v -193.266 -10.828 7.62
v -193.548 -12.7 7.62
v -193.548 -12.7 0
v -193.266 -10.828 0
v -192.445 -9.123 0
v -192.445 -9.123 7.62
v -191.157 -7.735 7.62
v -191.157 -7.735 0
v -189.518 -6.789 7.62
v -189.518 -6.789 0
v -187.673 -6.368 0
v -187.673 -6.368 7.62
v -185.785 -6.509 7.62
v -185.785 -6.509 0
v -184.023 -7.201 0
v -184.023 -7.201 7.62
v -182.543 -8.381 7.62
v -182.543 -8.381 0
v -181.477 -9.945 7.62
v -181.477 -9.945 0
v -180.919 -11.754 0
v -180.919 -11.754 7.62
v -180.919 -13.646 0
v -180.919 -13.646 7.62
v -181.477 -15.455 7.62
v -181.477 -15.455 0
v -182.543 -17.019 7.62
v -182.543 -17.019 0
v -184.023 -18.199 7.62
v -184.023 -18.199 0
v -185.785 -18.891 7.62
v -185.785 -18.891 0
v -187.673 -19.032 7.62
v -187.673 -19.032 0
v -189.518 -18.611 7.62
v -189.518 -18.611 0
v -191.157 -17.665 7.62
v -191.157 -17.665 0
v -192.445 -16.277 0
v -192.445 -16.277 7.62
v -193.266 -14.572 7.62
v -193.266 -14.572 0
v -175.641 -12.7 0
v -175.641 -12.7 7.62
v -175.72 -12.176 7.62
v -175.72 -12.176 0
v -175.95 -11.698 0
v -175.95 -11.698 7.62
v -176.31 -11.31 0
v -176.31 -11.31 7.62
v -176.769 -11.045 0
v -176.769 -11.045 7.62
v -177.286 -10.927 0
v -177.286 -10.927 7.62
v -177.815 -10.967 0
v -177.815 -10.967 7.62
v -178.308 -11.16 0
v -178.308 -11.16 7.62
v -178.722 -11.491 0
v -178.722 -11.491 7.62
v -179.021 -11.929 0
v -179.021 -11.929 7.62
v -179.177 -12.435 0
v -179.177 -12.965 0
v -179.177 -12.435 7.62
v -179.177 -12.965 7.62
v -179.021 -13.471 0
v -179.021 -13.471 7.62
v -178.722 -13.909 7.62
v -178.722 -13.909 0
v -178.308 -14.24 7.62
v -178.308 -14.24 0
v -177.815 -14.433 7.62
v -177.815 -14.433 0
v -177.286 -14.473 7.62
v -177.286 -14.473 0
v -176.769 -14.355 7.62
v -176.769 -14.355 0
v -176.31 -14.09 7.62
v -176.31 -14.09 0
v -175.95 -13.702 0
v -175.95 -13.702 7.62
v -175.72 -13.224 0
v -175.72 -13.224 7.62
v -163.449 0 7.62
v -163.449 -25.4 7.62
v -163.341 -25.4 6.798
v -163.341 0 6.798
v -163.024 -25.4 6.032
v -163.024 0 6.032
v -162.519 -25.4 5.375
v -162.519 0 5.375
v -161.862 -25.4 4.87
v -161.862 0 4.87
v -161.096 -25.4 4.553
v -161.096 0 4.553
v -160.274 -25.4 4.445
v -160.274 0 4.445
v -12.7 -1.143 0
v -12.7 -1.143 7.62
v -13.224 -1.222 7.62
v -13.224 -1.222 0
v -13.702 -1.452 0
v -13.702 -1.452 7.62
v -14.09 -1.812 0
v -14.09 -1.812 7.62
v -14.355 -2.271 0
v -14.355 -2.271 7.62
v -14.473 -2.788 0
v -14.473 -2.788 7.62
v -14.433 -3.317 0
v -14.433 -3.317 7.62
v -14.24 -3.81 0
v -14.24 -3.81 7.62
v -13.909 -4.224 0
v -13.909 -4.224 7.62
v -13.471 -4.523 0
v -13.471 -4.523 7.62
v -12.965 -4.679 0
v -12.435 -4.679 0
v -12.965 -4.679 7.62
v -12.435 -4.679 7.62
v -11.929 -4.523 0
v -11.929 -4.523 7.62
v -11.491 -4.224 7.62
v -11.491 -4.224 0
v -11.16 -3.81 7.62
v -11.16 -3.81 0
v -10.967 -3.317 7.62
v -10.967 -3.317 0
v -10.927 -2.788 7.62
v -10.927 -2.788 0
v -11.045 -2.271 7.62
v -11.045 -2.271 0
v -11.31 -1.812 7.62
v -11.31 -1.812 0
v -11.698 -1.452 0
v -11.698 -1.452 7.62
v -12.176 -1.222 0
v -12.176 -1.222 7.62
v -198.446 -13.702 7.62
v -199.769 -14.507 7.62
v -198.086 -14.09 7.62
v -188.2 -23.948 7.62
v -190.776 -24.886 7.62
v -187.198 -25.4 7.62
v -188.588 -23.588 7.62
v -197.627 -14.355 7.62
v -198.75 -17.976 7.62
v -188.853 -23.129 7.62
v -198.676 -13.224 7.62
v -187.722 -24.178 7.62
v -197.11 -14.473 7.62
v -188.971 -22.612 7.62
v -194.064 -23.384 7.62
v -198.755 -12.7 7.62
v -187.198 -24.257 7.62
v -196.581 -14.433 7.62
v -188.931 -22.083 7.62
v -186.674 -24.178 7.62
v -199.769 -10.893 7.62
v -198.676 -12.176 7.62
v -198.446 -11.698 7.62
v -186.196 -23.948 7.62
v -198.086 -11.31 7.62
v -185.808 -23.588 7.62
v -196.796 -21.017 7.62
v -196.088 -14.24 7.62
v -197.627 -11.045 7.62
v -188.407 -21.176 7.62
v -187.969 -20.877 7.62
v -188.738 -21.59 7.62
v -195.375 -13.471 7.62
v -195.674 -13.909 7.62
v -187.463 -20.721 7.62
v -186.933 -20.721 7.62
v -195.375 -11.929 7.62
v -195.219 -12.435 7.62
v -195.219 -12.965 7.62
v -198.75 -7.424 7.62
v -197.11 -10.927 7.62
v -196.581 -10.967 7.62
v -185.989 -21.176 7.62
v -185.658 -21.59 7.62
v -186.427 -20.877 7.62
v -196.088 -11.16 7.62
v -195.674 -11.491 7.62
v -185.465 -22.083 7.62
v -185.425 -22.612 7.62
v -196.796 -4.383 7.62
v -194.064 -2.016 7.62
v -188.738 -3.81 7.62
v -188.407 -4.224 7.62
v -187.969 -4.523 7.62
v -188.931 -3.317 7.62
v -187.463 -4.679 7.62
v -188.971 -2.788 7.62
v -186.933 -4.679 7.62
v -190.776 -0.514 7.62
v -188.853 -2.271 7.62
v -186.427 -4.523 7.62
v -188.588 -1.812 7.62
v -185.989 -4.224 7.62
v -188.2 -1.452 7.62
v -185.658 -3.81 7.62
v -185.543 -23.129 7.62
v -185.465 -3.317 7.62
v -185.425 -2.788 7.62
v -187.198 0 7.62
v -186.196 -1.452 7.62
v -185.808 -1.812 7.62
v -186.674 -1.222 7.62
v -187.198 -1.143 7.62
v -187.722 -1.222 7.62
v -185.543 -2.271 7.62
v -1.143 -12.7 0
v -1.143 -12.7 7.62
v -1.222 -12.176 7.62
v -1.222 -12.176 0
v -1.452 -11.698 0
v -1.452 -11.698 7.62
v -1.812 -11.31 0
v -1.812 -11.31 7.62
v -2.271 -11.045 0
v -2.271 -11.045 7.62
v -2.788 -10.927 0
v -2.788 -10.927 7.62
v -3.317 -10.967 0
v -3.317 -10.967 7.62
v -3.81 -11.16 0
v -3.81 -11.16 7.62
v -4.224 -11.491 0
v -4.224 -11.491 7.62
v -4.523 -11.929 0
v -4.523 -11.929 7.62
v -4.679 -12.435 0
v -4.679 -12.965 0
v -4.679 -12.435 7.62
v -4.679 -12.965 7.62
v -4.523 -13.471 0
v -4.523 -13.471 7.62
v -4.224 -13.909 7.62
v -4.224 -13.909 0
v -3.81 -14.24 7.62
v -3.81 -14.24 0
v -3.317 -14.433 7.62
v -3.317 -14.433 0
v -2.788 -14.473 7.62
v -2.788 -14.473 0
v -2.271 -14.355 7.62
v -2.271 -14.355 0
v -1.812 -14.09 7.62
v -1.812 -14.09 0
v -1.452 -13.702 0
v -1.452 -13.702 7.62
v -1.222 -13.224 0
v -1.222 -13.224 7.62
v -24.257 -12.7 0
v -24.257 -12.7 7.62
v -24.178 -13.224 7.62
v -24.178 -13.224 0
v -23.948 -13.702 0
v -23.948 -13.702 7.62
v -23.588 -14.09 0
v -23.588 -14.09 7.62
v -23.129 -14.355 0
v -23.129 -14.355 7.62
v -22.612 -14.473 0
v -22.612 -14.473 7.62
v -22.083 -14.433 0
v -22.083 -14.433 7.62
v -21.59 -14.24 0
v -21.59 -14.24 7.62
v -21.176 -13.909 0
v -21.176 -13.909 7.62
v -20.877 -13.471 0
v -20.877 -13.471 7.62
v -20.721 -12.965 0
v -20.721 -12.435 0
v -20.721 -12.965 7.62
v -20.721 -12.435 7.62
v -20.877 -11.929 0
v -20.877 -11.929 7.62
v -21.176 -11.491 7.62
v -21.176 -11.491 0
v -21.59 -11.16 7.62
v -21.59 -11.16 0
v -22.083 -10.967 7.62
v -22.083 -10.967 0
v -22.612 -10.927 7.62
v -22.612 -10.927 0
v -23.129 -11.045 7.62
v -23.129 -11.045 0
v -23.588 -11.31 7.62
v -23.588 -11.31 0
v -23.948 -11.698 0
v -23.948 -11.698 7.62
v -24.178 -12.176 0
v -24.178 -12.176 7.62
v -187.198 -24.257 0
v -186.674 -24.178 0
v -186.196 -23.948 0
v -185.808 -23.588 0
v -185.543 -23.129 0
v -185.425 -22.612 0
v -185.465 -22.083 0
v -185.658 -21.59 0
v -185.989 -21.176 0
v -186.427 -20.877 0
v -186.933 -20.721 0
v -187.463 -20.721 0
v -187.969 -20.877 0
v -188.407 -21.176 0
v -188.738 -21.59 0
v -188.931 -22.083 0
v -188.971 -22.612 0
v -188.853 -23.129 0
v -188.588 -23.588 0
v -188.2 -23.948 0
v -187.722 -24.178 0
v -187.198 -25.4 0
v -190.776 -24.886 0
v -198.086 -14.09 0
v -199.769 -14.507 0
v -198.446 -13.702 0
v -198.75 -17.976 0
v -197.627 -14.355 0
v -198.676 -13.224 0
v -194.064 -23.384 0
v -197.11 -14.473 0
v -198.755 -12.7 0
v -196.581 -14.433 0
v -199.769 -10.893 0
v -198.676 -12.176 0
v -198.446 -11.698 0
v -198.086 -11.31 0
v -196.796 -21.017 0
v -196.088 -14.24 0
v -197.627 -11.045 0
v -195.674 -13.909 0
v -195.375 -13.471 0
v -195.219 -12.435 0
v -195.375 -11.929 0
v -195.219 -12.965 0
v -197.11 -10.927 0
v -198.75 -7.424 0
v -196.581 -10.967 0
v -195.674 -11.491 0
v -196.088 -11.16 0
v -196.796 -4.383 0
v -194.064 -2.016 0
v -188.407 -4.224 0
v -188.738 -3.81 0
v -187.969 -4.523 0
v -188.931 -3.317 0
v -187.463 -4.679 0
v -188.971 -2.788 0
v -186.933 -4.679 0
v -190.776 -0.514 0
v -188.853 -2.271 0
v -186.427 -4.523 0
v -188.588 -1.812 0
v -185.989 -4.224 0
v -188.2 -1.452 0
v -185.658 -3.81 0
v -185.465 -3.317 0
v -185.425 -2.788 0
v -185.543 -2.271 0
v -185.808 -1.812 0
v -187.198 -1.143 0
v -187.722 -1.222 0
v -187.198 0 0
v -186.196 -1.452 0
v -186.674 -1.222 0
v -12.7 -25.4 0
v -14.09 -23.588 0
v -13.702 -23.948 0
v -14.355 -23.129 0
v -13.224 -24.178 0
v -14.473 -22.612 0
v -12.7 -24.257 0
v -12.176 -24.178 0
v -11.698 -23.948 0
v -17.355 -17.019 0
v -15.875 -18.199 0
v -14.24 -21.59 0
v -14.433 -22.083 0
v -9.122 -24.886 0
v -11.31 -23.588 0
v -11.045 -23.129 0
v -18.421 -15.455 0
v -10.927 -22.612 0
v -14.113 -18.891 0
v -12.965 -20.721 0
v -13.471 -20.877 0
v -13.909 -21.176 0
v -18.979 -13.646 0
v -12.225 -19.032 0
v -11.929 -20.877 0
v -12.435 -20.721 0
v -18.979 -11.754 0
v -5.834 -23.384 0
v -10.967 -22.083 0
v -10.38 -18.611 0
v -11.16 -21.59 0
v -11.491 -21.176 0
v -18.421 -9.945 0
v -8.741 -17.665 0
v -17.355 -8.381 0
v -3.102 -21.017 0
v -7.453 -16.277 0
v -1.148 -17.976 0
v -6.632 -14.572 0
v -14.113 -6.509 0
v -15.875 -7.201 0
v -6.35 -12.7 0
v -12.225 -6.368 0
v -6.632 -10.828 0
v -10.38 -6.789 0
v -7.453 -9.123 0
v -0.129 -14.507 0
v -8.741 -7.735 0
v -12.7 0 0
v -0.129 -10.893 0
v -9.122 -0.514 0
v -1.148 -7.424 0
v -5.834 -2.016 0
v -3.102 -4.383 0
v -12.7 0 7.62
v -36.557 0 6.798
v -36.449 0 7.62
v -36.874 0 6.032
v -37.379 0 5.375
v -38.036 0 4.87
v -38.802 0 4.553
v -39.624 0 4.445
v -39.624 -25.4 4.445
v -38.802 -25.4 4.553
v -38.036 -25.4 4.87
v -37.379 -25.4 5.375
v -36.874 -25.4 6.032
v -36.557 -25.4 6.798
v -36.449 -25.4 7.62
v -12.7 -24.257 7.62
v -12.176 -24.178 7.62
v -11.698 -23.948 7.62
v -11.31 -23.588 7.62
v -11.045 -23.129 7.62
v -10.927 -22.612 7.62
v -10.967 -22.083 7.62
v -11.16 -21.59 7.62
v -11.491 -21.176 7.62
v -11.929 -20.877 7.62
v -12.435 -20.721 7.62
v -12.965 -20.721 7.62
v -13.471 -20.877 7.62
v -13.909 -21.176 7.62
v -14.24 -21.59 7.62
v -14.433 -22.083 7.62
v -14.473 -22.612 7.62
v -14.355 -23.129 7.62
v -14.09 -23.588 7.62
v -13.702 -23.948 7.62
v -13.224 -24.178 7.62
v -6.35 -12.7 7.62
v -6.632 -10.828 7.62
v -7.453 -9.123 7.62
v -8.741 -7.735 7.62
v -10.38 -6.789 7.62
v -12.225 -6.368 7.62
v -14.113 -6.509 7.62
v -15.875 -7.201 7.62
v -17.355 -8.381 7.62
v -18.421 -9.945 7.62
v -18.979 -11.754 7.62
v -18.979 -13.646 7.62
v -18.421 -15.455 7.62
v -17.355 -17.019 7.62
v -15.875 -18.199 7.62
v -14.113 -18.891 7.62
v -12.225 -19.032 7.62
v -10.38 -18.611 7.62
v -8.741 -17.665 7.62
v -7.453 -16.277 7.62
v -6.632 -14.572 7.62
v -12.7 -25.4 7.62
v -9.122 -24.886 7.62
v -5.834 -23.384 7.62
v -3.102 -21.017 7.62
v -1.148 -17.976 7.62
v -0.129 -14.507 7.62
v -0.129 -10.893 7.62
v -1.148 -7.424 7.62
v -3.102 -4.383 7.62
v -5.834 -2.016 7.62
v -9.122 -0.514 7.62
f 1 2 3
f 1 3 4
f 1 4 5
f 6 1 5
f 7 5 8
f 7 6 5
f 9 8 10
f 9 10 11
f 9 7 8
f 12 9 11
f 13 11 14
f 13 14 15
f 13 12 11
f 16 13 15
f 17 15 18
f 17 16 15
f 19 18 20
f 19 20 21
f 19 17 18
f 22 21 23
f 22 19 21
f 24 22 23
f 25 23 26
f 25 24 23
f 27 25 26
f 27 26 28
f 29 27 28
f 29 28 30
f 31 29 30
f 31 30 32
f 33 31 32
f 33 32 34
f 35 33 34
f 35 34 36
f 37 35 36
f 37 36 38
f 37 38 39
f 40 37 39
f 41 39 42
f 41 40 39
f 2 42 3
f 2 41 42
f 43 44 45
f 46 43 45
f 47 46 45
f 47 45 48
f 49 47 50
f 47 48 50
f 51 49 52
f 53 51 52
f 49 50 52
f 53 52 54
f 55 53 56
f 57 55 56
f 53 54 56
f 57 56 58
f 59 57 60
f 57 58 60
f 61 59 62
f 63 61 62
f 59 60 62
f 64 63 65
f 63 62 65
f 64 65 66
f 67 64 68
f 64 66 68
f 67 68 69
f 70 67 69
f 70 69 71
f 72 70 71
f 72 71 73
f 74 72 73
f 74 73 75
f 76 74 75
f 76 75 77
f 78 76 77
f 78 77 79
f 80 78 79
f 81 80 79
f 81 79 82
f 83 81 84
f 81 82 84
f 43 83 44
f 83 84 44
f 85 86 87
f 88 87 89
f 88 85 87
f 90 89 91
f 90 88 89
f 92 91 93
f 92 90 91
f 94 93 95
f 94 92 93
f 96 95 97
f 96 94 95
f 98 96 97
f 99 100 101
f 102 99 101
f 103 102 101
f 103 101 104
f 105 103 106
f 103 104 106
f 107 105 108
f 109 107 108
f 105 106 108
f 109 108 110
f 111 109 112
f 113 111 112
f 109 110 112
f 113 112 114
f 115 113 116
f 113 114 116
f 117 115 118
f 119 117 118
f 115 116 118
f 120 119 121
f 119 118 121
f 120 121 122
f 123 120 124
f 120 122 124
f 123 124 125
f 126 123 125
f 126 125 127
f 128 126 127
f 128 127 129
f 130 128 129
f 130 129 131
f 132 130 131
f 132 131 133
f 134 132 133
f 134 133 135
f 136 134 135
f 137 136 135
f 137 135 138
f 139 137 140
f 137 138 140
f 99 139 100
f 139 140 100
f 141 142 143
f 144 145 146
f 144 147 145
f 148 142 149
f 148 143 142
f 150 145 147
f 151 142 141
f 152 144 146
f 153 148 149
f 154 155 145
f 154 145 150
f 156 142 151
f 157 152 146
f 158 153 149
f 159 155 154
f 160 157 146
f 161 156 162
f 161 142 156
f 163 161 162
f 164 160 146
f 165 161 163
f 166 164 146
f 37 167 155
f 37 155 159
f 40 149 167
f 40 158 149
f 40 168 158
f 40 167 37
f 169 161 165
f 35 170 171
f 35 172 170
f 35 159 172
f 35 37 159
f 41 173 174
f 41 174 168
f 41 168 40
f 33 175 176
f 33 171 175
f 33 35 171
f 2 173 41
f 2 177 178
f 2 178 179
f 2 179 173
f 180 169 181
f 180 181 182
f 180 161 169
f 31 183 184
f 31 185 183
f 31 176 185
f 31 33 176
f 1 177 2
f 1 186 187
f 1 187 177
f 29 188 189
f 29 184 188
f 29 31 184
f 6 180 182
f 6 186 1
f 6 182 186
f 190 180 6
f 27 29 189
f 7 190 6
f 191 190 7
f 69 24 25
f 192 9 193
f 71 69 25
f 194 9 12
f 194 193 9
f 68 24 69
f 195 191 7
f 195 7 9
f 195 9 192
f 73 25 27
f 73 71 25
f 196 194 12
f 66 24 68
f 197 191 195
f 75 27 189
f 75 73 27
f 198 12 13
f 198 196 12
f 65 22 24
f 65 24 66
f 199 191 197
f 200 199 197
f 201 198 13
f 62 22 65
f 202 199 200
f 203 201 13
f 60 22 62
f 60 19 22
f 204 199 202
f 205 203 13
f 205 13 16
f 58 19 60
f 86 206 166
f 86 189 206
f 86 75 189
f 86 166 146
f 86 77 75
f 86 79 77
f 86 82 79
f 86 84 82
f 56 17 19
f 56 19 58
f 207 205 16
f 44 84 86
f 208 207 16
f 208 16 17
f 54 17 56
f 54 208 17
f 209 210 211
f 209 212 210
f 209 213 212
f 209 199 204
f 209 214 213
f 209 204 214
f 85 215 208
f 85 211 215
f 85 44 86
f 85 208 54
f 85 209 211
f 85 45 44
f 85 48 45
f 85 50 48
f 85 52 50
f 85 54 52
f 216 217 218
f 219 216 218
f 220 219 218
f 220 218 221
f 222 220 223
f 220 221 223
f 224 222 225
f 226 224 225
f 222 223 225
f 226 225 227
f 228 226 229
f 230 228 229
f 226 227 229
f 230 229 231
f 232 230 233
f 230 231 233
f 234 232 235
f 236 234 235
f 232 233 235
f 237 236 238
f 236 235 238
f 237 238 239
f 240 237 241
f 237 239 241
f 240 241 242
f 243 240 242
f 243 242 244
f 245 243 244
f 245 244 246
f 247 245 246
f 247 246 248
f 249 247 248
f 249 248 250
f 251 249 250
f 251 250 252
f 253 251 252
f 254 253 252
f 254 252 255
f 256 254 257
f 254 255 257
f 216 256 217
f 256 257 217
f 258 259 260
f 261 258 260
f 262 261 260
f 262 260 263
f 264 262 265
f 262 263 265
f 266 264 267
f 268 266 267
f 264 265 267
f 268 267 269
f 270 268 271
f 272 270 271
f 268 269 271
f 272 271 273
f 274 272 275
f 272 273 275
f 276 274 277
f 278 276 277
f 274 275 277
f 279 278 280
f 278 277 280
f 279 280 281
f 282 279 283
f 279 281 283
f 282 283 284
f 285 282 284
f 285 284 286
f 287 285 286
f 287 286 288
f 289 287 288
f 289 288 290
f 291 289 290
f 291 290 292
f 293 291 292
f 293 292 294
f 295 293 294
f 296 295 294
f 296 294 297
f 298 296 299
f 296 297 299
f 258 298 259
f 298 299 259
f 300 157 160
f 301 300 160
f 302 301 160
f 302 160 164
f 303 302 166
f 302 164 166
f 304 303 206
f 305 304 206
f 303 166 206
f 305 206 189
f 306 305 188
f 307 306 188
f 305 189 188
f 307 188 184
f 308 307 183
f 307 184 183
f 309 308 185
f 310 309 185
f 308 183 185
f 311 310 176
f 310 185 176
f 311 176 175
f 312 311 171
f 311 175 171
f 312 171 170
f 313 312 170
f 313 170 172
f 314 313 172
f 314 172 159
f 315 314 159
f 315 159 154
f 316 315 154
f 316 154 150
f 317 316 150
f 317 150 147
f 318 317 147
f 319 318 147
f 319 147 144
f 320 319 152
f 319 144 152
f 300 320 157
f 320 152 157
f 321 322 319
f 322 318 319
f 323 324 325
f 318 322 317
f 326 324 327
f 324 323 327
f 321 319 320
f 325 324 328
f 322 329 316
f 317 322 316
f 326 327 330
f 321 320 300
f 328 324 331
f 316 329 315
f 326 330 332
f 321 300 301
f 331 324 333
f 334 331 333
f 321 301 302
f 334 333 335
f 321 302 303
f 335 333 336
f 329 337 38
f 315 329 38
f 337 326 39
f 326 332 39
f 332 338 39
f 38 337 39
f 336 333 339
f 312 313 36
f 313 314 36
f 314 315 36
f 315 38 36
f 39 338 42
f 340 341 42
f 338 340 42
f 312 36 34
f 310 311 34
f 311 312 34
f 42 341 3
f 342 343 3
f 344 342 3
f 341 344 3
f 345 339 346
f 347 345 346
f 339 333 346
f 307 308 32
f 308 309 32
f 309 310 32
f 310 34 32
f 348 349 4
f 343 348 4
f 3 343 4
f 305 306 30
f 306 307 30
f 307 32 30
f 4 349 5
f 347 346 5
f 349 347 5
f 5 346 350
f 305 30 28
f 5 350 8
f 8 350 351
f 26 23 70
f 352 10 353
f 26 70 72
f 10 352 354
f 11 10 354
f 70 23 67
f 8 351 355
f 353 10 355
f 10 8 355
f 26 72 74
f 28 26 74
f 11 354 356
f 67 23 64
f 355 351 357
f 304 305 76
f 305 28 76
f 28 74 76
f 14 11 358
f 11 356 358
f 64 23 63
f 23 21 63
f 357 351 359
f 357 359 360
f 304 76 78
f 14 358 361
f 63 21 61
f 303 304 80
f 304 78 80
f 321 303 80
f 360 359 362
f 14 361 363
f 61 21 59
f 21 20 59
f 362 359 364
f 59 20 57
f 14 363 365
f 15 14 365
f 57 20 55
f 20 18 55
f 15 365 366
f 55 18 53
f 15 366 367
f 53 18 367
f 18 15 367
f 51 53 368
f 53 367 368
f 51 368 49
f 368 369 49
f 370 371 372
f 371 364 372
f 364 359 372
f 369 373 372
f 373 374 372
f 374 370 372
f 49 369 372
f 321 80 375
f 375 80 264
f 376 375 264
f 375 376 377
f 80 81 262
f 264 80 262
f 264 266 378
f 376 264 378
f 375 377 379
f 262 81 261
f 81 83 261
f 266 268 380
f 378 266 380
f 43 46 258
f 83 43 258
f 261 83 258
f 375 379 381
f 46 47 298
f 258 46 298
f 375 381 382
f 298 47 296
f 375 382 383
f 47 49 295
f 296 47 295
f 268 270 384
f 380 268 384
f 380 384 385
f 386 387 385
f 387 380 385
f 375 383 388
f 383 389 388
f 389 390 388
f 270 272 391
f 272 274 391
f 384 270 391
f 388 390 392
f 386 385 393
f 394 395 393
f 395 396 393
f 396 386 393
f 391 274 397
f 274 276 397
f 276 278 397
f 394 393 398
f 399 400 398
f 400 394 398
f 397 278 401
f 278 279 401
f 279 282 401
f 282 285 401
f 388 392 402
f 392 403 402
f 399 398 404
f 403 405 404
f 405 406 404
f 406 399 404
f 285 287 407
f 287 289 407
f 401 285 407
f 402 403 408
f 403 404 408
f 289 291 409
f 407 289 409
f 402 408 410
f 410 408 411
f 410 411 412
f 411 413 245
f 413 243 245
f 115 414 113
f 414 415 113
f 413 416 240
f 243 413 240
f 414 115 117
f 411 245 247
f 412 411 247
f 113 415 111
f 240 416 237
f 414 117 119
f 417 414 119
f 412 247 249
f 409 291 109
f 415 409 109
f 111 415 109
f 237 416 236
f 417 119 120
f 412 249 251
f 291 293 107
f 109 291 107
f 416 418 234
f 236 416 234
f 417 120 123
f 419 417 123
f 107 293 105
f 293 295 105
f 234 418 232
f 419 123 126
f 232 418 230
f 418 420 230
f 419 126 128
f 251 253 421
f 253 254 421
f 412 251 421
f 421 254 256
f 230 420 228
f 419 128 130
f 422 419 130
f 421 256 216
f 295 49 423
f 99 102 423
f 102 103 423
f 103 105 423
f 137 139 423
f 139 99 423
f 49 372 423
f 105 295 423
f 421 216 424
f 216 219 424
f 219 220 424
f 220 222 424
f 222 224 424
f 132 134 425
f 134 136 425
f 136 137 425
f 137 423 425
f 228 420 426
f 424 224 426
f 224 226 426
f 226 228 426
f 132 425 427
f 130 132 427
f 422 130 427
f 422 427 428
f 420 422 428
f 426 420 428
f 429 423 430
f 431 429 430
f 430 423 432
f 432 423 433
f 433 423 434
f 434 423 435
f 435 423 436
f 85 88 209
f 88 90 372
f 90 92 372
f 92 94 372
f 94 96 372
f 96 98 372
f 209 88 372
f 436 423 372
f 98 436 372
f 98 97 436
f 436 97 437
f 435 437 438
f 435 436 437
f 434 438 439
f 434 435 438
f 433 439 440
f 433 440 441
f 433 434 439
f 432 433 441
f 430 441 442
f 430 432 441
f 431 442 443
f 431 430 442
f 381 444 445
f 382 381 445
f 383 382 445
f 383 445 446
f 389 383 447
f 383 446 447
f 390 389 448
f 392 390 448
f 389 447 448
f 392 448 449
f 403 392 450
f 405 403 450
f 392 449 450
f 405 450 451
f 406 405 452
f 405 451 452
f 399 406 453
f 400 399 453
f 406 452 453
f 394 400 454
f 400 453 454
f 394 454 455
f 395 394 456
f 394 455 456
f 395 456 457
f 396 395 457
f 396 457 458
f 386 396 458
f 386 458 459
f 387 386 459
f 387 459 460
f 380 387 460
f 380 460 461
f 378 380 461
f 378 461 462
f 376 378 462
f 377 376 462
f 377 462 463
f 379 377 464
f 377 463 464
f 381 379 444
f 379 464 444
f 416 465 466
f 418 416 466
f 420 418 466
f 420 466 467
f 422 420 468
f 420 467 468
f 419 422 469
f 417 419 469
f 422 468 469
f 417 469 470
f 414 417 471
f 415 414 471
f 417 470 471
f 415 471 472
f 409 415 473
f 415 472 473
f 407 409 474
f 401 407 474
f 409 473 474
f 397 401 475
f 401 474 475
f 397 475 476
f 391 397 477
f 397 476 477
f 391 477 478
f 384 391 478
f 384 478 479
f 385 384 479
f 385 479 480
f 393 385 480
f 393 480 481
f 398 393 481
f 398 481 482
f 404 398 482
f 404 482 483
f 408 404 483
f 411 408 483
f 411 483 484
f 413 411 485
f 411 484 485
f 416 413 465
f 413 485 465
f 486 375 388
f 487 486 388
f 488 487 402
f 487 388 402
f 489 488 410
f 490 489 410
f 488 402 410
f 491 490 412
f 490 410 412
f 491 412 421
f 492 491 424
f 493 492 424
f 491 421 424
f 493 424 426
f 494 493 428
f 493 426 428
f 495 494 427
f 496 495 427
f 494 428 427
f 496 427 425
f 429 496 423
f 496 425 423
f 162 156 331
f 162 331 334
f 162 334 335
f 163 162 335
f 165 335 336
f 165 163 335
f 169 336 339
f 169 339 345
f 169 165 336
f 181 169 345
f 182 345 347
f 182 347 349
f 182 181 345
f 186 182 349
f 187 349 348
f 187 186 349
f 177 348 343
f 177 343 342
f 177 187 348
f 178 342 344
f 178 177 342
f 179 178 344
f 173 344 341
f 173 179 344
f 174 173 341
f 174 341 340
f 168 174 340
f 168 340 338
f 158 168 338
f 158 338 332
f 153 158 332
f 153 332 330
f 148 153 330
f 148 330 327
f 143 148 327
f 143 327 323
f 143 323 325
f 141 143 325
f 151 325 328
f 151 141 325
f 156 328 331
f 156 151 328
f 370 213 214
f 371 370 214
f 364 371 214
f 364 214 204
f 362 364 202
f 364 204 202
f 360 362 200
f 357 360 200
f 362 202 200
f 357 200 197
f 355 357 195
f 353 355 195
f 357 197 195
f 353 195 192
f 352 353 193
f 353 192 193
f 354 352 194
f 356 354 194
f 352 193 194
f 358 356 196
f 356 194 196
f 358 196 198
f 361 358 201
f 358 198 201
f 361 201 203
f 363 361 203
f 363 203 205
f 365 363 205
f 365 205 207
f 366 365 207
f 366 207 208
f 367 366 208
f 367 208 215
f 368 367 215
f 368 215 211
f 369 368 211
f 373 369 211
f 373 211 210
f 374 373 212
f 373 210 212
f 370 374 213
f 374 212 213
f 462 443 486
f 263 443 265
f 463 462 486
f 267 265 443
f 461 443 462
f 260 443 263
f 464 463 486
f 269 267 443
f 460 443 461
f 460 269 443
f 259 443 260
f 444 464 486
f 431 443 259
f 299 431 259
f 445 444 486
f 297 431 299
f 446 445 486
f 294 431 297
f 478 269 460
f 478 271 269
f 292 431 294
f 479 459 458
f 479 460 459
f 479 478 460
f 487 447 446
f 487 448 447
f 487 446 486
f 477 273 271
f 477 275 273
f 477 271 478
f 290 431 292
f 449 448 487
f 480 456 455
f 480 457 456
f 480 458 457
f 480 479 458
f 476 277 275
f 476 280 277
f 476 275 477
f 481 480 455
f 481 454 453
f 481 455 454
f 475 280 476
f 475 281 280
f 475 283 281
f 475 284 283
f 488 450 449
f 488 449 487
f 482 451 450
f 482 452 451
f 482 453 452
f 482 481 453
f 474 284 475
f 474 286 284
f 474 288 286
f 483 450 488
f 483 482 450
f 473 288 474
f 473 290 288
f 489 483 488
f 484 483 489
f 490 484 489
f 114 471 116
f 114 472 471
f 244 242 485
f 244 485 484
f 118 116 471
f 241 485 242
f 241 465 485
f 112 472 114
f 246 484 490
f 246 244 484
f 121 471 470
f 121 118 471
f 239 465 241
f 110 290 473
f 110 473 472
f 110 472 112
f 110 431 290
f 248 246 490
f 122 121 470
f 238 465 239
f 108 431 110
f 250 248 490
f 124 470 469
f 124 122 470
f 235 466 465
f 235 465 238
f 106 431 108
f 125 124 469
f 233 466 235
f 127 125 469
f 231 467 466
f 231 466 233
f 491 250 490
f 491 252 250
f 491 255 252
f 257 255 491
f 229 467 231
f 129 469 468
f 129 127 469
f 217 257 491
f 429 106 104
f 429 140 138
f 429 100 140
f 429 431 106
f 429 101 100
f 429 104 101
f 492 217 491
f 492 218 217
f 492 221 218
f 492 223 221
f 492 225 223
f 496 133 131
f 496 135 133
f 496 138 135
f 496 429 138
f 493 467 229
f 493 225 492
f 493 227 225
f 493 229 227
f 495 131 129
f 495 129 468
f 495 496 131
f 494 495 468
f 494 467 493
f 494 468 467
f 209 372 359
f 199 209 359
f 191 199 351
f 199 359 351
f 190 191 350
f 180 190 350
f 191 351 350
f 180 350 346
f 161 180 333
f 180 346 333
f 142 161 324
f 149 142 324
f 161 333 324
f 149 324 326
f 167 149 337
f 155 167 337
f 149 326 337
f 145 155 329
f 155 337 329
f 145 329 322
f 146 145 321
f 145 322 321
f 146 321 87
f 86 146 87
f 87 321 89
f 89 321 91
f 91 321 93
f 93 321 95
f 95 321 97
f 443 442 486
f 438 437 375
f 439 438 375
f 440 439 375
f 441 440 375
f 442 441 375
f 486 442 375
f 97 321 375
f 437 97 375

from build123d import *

# Parameters (mm, degrees)
SKETCH1_R               = 12.7
BOSS_EXTRUDE1_DEPTH     = 7.62
SKETCH2_R               = 6.35
CUT_EXTRUDE1_DEPTH      = 7.62
SKETCH3_R               = 1.778
CUT_EXTRUDE2_DEPTH      = 7.62
CIRPATTERN1_COUNT       = 4
MIRROR1_COPY_1_SKETCH_R = 1.778
MIRROR1_COPY_1_DEPTH    = 7.62
MIRROR1_COPY_2_SKETCH_R = 1.778
MIRROR1_COPY_2_DEPTH    = 7.62
MIRROR1_COPY_3_SKETCH_R = 1.778
MIRROR1_COPY_3_DEPTH    = 7.62
SKETCH4_W               = 127
SKETCH4_H               = 3.175
CUT_EXTRUDE3_DEPTH      = 25.4
FILLET1_R               = 3.175


with BuildPart() as part:
    # Sketch1 → Boss-Extrude1 (new body)
    with BuildSketch(Plane.XY):
        with BuildLine():
            ThreePointArc((-12.7, -25.4), (-25.4, -12.7), (-12.7, 0))
            Line((-12.7, 0), (-187.198, 0))
            ThreePointArc((-187.198, 0), (-178.217743879, -3.719743879), (-174.498, -12.7))
            ThreePointArc((-174.498, -12.7), (-178.217743879, -21.680256121), (-187.198, -25.4))
            Line((-187.198, -25.4), (-12.7, -25.4))
        make_face()
        with Locations((-187.198, -12.7)):
            Circle(SKETCH1_R)
        with Locations((-12.7, -12.7)):
            Circle(SKETCH1_R)
    extrude(amount=BOSS_EXTRUDE1_DEPTH)

    # Sketch2 → Cut-Extrude1 (cut)
    with BuildSketch(Plane.XY.offset(7.62)):
        with Locations((-12.7, -12.7)):
            Circle(SKETCH2_R)
    cut_extrude1 = extrude(amount=-CUT_EXTRUDE1_DEPTH, mode=Mode.SUBTRACT)

    # Sketch3 → Cut-Extrude2 (cut)
    with BuildSketch(Plane.XY.offset(7.62)):
        with Locations((-2.921, -12.7)):
            Circle(SKETCH3_R)
    cut_extrude2 = extrude(amount=-CUT_EXTRUDE2_DEPTH, mode=Mode.SUBTRACT)

    # CirPattern1: Cut-Extrude2 ×4 about axis
    cirpattern1_axis = Axis((-12.7, -12.7, 0), (0, 0, 1))
    for i in range(1, CIRPATTERN1_COUNT):
        add(cut_extrude2.rotate(cirpattern1_axis, i * 360 / CIRPATTERN1_COUNT), mode=Mode.SUBTRACT)

    # Mirror1: Cut-Extrude1, Cut-Extrude2 across plane
    add(cut_extrude1.mirror(Plane(origin=(-99.949, 0, 0), x_dir=(0, 0, 1), z_dir=(1, 0, 0))), mode=Mode.SUBTRACT)
    add(cut_extrude2.mirror(Plane(origin=(-99.949, 0, 0), x_dir=(0, 0, 1), z_dir=(1, 0, 0))), mode=Mode.SUBTRACT)

    # Mirror1 copy 1 sketch → Mirror1 copy 1 (cut)
    with BuildSketch(Plane(origin=(-174.498, 0, 7.62), x_dir=(0, 1, 0), z_dir=(0, 0, 1))):
        with Locations((-2.921, 12.7)):
            Circle(MIRROR1_COPY_1_SKETCH_R)
    extrude(amount=-MIRROR1_COPY_1_DEPTH, mode=Mode.SUBTRACT)

    # Mirror1 copy 2 sketch → Mirror1 copy 2 (cut)
    with BuildSketch(Plane(origin=(-174.498, -25.4, 7.62), x_dir=(1, 0, 0), z_dir=(0, 0, 1))):
        with Locations((-2.921, 12.7)):
            Circle(MIRROR1_COPY_2_SKETCH_R)
    extrude(amount=-MIRROR1_COPY_2_DEPTH, mode=Mode.SUBTRACT)

    # Mirror1 copy 3 sketch → Mirror1 copy 3 (cut)
    with BuildSketch(Plane(origin=(-199.898, -25.4, 7.62), x_dir=(0, -1, 0), z_dir=(0, 0, 1))):
        with Locations((-2.921, 12.7)):
            Circle(MIRROR1_COPY_3_SKETCH_R)
    extrude(amount=-MIRROR1_COPY_3_DEPTH, mode=Mode.SUBTRACT)

    # Sketch4 → Cut-Extrude3 (cut)
    with BuildSketch(Plane.XZ.offset(25.4)):
        with Locations((-99.949, 6.0325)):
            Rectangle(SKETCH4_W, SKETCH4_H)
    extrude(amount=-CUT_EXTRUDE3_DEPTH, mode=Mode.SUBTRACT)

    # Fillet1
    fillet1_edges = [part.edges().sort_by_distance(p)[0] for p in [
        (-36.449, -12.7, 4.445),
        (-163.449, -12.7, 4.445),
    ]]
    fillet(fillet1_edges, radius=FILLET1_R - 0.0001)  # a hair under: the kernel refuses the full size


solid = part.part
